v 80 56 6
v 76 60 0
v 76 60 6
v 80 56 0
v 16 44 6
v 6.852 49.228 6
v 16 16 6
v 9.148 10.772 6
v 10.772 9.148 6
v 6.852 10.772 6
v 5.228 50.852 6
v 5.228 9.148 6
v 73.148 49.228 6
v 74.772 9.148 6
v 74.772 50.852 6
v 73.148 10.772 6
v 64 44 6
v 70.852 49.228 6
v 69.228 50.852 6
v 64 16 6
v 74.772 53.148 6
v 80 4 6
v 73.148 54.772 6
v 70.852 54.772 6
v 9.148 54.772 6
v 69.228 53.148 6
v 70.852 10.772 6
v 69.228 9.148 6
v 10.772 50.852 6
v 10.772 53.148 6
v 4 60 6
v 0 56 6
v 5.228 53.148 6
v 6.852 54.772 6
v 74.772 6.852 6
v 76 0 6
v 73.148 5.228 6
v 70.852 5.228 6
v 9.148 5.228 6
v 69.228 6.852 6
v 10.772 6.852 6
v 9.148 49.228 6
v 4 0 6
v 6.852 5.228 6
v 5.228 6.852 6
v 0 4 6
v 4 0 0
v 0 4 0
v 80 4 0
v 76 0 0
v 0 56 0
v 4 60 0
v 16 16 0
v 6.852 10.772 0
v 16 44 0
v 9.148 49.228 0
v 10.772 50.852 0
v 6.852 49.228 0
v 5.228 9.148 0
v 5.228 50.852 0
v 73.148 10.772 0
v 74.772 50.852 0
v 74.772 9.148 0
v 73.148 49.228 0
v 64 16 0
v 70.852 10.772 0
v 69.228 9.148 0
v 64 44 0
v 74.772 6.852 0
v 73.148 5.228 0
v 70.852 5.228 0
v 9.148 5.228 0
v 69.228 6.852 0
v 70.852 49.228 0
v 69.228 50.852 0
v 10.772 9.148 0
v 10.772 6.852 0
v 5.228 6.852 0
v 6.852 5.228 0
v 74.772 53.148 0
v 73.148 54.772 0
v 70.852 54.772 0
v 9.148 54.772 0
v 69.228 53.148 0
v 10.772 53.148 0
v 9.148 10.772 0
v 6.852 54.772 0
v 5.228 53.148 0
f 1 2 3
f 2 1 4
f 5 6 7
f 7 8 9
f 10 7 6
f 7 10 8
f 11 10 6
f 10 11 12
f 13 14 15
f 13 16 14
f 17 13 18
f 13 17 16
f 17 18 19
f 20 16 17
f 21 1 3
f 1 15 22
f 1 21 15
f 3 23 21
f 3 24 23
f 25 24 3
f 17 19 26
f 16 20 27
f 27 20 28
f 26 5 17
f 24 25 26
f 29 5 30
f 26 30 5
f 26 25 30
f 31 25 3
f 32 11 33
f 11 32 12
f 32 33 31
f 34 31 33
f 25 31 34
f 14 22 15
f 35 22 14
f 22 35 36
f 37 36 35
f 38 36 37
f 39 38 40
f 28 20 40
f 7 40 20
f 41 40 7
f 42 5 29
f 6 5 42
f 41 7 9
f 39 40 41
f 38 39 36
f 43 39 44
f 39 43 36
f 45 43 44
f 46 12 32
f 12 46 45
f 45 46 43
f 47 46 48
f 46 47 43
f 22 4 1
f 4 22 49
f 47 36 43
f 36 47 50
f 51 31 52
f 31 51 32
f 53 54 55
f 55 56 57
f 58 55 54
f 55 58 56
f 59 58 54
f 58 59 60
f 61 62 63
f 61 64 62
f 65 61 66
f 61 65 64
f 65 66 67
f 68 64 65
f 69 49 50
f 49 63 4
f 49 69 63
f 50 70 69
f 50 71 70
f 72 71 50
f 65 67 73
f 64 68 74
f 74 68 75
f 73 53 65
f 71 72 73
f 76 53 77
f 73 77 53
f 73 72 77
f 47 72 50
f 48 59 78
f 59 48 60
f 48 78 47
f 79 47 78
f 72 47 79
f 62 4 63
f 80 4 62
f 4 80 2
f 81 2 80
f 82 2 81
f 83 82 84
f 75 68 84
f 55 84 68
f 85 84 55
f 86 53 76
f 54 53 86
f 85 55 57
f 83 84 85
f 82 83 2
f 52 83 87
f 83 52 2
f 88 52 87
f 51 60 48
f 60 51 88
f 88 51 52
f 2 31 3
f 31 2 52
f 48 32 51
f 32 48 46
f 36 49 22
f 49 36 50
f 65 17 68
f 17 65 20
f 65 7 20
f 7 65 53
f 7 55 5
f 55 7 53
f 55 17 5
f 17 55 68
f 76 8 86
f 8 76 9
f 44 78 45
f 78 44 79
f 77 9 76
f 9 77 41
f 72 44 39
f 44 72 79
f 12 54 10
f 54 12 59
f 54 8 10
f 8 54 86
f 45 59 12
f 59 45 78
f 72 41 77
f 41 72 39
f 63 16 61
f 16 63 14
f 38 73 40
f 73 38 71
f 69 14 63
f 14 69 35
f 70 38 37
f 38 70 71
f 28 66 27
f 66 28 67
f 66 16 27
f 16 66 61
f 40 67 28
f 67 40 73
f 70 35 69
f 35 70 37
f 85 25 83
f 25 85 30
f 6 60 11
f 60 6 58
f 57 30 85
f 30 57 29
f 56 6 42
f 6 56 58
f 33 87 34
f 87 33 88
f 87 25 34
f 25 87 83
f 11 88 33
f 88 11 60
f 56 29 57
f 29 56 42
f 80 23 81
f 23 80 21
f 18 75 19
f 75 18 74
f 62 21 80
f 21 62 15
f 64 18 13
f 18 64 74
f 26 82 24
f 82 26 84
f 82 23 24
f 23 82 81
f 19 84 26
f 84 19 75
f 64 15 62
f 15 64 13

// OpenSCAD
$fn = 32;

// ----------------------------------------------------------------------
// Frame plate: 80 x 60 frame, 16 mm rails
// ----------------------------------------------------------------------

// --- parameters (mm) ---
plate_l = 80;             // plate length, X
plate_w = 60;             // plate width, Y
plate_t = 6;              // plate thickness, Z (extrusion height)
corner_c = 4;             // corner chamfer
frame_bar = 16;           // frame rail width
bolt_r = 3;               // corner bolt window radius
bolt_inset = 8;           // bolt centre inset from the edges
fit_tol = 0.1;            // declared fit tolerance (prompt contract)
free_tol = 0.5;           // declared free tolerance (prompt contract)

win_l = plate_l - 2 * frame_bar;  // window length
win_w = plate_w - 2 * frame_bar;  // window width
bolt_d = 2 * bolt_r;  // corner hole diameter

profile = [[4, 0], [76, 0], [80, 4], [80, 56], [76, 60], [4, 60], [0, 56], [0, 4]];  // primary outline, 8 points, counter clockwise
void_1 = [[16, 16], [64, 16], [64, 44], [16, 44]];  // the window, 4 points
void_2 = [[10.772, 9.148], [9.148, 10.772], [6.852, 10.772], [5.228, 9.148], [5.228, 6.852], [6.852, 5.228], [9.148, 5.228], [10.772, 6.852]];  // corner bolt window, 8 points
void_3 = [[74.772, 9.148], [73.148, 10.772], [70.852, 10.772], [69.228, 9.148], [69.228, 6.852], [70.852, 5.228], [73.148, 5.228], [74.772, 6.852]];  // corner bolt window, 8 points
void_4 = [[10.772, 53.148], [9.148, 54.772], [6.852, 54.772], [5.228, 53.148], [5.228, 50.852], [6.852, 49.228], [9.148, 49.228], [10.772, 50.852]];  // corner bolt window, 8 points
void_5 = [[74.772, 53.148], [73.148, 54.772], [70.852, 54.772], [69.228, 53.148], [69.228, 50.852], [70.852, 49.228], [73.148, 49.228], [74.772, 50.852]];  // corner bolt window, 8 points

// --- the one profile operation ---
difference() {
  linear_extrude(height = plate_t) polygon(points = profile);
  translate([0, 0, -1])
    linear_extrude(height = plate_t + 2) polygon(points = void_1);
  translate([0, 0, -1])
    linear_extrude(height = plate_t + 2) polygon(points = void_2);
  translate([0, 0, -1])
    linear_extrude(height = plate_t + 2) polygon(points = void_3);
  translate([0, 0, -1])
    linear_extrude(height = plate_t + 2) polygon(points = void_4);
  translate([0, 0, -1])
    linear_extrude(height = plate_t + 2) polygon(points = void_5);
}
